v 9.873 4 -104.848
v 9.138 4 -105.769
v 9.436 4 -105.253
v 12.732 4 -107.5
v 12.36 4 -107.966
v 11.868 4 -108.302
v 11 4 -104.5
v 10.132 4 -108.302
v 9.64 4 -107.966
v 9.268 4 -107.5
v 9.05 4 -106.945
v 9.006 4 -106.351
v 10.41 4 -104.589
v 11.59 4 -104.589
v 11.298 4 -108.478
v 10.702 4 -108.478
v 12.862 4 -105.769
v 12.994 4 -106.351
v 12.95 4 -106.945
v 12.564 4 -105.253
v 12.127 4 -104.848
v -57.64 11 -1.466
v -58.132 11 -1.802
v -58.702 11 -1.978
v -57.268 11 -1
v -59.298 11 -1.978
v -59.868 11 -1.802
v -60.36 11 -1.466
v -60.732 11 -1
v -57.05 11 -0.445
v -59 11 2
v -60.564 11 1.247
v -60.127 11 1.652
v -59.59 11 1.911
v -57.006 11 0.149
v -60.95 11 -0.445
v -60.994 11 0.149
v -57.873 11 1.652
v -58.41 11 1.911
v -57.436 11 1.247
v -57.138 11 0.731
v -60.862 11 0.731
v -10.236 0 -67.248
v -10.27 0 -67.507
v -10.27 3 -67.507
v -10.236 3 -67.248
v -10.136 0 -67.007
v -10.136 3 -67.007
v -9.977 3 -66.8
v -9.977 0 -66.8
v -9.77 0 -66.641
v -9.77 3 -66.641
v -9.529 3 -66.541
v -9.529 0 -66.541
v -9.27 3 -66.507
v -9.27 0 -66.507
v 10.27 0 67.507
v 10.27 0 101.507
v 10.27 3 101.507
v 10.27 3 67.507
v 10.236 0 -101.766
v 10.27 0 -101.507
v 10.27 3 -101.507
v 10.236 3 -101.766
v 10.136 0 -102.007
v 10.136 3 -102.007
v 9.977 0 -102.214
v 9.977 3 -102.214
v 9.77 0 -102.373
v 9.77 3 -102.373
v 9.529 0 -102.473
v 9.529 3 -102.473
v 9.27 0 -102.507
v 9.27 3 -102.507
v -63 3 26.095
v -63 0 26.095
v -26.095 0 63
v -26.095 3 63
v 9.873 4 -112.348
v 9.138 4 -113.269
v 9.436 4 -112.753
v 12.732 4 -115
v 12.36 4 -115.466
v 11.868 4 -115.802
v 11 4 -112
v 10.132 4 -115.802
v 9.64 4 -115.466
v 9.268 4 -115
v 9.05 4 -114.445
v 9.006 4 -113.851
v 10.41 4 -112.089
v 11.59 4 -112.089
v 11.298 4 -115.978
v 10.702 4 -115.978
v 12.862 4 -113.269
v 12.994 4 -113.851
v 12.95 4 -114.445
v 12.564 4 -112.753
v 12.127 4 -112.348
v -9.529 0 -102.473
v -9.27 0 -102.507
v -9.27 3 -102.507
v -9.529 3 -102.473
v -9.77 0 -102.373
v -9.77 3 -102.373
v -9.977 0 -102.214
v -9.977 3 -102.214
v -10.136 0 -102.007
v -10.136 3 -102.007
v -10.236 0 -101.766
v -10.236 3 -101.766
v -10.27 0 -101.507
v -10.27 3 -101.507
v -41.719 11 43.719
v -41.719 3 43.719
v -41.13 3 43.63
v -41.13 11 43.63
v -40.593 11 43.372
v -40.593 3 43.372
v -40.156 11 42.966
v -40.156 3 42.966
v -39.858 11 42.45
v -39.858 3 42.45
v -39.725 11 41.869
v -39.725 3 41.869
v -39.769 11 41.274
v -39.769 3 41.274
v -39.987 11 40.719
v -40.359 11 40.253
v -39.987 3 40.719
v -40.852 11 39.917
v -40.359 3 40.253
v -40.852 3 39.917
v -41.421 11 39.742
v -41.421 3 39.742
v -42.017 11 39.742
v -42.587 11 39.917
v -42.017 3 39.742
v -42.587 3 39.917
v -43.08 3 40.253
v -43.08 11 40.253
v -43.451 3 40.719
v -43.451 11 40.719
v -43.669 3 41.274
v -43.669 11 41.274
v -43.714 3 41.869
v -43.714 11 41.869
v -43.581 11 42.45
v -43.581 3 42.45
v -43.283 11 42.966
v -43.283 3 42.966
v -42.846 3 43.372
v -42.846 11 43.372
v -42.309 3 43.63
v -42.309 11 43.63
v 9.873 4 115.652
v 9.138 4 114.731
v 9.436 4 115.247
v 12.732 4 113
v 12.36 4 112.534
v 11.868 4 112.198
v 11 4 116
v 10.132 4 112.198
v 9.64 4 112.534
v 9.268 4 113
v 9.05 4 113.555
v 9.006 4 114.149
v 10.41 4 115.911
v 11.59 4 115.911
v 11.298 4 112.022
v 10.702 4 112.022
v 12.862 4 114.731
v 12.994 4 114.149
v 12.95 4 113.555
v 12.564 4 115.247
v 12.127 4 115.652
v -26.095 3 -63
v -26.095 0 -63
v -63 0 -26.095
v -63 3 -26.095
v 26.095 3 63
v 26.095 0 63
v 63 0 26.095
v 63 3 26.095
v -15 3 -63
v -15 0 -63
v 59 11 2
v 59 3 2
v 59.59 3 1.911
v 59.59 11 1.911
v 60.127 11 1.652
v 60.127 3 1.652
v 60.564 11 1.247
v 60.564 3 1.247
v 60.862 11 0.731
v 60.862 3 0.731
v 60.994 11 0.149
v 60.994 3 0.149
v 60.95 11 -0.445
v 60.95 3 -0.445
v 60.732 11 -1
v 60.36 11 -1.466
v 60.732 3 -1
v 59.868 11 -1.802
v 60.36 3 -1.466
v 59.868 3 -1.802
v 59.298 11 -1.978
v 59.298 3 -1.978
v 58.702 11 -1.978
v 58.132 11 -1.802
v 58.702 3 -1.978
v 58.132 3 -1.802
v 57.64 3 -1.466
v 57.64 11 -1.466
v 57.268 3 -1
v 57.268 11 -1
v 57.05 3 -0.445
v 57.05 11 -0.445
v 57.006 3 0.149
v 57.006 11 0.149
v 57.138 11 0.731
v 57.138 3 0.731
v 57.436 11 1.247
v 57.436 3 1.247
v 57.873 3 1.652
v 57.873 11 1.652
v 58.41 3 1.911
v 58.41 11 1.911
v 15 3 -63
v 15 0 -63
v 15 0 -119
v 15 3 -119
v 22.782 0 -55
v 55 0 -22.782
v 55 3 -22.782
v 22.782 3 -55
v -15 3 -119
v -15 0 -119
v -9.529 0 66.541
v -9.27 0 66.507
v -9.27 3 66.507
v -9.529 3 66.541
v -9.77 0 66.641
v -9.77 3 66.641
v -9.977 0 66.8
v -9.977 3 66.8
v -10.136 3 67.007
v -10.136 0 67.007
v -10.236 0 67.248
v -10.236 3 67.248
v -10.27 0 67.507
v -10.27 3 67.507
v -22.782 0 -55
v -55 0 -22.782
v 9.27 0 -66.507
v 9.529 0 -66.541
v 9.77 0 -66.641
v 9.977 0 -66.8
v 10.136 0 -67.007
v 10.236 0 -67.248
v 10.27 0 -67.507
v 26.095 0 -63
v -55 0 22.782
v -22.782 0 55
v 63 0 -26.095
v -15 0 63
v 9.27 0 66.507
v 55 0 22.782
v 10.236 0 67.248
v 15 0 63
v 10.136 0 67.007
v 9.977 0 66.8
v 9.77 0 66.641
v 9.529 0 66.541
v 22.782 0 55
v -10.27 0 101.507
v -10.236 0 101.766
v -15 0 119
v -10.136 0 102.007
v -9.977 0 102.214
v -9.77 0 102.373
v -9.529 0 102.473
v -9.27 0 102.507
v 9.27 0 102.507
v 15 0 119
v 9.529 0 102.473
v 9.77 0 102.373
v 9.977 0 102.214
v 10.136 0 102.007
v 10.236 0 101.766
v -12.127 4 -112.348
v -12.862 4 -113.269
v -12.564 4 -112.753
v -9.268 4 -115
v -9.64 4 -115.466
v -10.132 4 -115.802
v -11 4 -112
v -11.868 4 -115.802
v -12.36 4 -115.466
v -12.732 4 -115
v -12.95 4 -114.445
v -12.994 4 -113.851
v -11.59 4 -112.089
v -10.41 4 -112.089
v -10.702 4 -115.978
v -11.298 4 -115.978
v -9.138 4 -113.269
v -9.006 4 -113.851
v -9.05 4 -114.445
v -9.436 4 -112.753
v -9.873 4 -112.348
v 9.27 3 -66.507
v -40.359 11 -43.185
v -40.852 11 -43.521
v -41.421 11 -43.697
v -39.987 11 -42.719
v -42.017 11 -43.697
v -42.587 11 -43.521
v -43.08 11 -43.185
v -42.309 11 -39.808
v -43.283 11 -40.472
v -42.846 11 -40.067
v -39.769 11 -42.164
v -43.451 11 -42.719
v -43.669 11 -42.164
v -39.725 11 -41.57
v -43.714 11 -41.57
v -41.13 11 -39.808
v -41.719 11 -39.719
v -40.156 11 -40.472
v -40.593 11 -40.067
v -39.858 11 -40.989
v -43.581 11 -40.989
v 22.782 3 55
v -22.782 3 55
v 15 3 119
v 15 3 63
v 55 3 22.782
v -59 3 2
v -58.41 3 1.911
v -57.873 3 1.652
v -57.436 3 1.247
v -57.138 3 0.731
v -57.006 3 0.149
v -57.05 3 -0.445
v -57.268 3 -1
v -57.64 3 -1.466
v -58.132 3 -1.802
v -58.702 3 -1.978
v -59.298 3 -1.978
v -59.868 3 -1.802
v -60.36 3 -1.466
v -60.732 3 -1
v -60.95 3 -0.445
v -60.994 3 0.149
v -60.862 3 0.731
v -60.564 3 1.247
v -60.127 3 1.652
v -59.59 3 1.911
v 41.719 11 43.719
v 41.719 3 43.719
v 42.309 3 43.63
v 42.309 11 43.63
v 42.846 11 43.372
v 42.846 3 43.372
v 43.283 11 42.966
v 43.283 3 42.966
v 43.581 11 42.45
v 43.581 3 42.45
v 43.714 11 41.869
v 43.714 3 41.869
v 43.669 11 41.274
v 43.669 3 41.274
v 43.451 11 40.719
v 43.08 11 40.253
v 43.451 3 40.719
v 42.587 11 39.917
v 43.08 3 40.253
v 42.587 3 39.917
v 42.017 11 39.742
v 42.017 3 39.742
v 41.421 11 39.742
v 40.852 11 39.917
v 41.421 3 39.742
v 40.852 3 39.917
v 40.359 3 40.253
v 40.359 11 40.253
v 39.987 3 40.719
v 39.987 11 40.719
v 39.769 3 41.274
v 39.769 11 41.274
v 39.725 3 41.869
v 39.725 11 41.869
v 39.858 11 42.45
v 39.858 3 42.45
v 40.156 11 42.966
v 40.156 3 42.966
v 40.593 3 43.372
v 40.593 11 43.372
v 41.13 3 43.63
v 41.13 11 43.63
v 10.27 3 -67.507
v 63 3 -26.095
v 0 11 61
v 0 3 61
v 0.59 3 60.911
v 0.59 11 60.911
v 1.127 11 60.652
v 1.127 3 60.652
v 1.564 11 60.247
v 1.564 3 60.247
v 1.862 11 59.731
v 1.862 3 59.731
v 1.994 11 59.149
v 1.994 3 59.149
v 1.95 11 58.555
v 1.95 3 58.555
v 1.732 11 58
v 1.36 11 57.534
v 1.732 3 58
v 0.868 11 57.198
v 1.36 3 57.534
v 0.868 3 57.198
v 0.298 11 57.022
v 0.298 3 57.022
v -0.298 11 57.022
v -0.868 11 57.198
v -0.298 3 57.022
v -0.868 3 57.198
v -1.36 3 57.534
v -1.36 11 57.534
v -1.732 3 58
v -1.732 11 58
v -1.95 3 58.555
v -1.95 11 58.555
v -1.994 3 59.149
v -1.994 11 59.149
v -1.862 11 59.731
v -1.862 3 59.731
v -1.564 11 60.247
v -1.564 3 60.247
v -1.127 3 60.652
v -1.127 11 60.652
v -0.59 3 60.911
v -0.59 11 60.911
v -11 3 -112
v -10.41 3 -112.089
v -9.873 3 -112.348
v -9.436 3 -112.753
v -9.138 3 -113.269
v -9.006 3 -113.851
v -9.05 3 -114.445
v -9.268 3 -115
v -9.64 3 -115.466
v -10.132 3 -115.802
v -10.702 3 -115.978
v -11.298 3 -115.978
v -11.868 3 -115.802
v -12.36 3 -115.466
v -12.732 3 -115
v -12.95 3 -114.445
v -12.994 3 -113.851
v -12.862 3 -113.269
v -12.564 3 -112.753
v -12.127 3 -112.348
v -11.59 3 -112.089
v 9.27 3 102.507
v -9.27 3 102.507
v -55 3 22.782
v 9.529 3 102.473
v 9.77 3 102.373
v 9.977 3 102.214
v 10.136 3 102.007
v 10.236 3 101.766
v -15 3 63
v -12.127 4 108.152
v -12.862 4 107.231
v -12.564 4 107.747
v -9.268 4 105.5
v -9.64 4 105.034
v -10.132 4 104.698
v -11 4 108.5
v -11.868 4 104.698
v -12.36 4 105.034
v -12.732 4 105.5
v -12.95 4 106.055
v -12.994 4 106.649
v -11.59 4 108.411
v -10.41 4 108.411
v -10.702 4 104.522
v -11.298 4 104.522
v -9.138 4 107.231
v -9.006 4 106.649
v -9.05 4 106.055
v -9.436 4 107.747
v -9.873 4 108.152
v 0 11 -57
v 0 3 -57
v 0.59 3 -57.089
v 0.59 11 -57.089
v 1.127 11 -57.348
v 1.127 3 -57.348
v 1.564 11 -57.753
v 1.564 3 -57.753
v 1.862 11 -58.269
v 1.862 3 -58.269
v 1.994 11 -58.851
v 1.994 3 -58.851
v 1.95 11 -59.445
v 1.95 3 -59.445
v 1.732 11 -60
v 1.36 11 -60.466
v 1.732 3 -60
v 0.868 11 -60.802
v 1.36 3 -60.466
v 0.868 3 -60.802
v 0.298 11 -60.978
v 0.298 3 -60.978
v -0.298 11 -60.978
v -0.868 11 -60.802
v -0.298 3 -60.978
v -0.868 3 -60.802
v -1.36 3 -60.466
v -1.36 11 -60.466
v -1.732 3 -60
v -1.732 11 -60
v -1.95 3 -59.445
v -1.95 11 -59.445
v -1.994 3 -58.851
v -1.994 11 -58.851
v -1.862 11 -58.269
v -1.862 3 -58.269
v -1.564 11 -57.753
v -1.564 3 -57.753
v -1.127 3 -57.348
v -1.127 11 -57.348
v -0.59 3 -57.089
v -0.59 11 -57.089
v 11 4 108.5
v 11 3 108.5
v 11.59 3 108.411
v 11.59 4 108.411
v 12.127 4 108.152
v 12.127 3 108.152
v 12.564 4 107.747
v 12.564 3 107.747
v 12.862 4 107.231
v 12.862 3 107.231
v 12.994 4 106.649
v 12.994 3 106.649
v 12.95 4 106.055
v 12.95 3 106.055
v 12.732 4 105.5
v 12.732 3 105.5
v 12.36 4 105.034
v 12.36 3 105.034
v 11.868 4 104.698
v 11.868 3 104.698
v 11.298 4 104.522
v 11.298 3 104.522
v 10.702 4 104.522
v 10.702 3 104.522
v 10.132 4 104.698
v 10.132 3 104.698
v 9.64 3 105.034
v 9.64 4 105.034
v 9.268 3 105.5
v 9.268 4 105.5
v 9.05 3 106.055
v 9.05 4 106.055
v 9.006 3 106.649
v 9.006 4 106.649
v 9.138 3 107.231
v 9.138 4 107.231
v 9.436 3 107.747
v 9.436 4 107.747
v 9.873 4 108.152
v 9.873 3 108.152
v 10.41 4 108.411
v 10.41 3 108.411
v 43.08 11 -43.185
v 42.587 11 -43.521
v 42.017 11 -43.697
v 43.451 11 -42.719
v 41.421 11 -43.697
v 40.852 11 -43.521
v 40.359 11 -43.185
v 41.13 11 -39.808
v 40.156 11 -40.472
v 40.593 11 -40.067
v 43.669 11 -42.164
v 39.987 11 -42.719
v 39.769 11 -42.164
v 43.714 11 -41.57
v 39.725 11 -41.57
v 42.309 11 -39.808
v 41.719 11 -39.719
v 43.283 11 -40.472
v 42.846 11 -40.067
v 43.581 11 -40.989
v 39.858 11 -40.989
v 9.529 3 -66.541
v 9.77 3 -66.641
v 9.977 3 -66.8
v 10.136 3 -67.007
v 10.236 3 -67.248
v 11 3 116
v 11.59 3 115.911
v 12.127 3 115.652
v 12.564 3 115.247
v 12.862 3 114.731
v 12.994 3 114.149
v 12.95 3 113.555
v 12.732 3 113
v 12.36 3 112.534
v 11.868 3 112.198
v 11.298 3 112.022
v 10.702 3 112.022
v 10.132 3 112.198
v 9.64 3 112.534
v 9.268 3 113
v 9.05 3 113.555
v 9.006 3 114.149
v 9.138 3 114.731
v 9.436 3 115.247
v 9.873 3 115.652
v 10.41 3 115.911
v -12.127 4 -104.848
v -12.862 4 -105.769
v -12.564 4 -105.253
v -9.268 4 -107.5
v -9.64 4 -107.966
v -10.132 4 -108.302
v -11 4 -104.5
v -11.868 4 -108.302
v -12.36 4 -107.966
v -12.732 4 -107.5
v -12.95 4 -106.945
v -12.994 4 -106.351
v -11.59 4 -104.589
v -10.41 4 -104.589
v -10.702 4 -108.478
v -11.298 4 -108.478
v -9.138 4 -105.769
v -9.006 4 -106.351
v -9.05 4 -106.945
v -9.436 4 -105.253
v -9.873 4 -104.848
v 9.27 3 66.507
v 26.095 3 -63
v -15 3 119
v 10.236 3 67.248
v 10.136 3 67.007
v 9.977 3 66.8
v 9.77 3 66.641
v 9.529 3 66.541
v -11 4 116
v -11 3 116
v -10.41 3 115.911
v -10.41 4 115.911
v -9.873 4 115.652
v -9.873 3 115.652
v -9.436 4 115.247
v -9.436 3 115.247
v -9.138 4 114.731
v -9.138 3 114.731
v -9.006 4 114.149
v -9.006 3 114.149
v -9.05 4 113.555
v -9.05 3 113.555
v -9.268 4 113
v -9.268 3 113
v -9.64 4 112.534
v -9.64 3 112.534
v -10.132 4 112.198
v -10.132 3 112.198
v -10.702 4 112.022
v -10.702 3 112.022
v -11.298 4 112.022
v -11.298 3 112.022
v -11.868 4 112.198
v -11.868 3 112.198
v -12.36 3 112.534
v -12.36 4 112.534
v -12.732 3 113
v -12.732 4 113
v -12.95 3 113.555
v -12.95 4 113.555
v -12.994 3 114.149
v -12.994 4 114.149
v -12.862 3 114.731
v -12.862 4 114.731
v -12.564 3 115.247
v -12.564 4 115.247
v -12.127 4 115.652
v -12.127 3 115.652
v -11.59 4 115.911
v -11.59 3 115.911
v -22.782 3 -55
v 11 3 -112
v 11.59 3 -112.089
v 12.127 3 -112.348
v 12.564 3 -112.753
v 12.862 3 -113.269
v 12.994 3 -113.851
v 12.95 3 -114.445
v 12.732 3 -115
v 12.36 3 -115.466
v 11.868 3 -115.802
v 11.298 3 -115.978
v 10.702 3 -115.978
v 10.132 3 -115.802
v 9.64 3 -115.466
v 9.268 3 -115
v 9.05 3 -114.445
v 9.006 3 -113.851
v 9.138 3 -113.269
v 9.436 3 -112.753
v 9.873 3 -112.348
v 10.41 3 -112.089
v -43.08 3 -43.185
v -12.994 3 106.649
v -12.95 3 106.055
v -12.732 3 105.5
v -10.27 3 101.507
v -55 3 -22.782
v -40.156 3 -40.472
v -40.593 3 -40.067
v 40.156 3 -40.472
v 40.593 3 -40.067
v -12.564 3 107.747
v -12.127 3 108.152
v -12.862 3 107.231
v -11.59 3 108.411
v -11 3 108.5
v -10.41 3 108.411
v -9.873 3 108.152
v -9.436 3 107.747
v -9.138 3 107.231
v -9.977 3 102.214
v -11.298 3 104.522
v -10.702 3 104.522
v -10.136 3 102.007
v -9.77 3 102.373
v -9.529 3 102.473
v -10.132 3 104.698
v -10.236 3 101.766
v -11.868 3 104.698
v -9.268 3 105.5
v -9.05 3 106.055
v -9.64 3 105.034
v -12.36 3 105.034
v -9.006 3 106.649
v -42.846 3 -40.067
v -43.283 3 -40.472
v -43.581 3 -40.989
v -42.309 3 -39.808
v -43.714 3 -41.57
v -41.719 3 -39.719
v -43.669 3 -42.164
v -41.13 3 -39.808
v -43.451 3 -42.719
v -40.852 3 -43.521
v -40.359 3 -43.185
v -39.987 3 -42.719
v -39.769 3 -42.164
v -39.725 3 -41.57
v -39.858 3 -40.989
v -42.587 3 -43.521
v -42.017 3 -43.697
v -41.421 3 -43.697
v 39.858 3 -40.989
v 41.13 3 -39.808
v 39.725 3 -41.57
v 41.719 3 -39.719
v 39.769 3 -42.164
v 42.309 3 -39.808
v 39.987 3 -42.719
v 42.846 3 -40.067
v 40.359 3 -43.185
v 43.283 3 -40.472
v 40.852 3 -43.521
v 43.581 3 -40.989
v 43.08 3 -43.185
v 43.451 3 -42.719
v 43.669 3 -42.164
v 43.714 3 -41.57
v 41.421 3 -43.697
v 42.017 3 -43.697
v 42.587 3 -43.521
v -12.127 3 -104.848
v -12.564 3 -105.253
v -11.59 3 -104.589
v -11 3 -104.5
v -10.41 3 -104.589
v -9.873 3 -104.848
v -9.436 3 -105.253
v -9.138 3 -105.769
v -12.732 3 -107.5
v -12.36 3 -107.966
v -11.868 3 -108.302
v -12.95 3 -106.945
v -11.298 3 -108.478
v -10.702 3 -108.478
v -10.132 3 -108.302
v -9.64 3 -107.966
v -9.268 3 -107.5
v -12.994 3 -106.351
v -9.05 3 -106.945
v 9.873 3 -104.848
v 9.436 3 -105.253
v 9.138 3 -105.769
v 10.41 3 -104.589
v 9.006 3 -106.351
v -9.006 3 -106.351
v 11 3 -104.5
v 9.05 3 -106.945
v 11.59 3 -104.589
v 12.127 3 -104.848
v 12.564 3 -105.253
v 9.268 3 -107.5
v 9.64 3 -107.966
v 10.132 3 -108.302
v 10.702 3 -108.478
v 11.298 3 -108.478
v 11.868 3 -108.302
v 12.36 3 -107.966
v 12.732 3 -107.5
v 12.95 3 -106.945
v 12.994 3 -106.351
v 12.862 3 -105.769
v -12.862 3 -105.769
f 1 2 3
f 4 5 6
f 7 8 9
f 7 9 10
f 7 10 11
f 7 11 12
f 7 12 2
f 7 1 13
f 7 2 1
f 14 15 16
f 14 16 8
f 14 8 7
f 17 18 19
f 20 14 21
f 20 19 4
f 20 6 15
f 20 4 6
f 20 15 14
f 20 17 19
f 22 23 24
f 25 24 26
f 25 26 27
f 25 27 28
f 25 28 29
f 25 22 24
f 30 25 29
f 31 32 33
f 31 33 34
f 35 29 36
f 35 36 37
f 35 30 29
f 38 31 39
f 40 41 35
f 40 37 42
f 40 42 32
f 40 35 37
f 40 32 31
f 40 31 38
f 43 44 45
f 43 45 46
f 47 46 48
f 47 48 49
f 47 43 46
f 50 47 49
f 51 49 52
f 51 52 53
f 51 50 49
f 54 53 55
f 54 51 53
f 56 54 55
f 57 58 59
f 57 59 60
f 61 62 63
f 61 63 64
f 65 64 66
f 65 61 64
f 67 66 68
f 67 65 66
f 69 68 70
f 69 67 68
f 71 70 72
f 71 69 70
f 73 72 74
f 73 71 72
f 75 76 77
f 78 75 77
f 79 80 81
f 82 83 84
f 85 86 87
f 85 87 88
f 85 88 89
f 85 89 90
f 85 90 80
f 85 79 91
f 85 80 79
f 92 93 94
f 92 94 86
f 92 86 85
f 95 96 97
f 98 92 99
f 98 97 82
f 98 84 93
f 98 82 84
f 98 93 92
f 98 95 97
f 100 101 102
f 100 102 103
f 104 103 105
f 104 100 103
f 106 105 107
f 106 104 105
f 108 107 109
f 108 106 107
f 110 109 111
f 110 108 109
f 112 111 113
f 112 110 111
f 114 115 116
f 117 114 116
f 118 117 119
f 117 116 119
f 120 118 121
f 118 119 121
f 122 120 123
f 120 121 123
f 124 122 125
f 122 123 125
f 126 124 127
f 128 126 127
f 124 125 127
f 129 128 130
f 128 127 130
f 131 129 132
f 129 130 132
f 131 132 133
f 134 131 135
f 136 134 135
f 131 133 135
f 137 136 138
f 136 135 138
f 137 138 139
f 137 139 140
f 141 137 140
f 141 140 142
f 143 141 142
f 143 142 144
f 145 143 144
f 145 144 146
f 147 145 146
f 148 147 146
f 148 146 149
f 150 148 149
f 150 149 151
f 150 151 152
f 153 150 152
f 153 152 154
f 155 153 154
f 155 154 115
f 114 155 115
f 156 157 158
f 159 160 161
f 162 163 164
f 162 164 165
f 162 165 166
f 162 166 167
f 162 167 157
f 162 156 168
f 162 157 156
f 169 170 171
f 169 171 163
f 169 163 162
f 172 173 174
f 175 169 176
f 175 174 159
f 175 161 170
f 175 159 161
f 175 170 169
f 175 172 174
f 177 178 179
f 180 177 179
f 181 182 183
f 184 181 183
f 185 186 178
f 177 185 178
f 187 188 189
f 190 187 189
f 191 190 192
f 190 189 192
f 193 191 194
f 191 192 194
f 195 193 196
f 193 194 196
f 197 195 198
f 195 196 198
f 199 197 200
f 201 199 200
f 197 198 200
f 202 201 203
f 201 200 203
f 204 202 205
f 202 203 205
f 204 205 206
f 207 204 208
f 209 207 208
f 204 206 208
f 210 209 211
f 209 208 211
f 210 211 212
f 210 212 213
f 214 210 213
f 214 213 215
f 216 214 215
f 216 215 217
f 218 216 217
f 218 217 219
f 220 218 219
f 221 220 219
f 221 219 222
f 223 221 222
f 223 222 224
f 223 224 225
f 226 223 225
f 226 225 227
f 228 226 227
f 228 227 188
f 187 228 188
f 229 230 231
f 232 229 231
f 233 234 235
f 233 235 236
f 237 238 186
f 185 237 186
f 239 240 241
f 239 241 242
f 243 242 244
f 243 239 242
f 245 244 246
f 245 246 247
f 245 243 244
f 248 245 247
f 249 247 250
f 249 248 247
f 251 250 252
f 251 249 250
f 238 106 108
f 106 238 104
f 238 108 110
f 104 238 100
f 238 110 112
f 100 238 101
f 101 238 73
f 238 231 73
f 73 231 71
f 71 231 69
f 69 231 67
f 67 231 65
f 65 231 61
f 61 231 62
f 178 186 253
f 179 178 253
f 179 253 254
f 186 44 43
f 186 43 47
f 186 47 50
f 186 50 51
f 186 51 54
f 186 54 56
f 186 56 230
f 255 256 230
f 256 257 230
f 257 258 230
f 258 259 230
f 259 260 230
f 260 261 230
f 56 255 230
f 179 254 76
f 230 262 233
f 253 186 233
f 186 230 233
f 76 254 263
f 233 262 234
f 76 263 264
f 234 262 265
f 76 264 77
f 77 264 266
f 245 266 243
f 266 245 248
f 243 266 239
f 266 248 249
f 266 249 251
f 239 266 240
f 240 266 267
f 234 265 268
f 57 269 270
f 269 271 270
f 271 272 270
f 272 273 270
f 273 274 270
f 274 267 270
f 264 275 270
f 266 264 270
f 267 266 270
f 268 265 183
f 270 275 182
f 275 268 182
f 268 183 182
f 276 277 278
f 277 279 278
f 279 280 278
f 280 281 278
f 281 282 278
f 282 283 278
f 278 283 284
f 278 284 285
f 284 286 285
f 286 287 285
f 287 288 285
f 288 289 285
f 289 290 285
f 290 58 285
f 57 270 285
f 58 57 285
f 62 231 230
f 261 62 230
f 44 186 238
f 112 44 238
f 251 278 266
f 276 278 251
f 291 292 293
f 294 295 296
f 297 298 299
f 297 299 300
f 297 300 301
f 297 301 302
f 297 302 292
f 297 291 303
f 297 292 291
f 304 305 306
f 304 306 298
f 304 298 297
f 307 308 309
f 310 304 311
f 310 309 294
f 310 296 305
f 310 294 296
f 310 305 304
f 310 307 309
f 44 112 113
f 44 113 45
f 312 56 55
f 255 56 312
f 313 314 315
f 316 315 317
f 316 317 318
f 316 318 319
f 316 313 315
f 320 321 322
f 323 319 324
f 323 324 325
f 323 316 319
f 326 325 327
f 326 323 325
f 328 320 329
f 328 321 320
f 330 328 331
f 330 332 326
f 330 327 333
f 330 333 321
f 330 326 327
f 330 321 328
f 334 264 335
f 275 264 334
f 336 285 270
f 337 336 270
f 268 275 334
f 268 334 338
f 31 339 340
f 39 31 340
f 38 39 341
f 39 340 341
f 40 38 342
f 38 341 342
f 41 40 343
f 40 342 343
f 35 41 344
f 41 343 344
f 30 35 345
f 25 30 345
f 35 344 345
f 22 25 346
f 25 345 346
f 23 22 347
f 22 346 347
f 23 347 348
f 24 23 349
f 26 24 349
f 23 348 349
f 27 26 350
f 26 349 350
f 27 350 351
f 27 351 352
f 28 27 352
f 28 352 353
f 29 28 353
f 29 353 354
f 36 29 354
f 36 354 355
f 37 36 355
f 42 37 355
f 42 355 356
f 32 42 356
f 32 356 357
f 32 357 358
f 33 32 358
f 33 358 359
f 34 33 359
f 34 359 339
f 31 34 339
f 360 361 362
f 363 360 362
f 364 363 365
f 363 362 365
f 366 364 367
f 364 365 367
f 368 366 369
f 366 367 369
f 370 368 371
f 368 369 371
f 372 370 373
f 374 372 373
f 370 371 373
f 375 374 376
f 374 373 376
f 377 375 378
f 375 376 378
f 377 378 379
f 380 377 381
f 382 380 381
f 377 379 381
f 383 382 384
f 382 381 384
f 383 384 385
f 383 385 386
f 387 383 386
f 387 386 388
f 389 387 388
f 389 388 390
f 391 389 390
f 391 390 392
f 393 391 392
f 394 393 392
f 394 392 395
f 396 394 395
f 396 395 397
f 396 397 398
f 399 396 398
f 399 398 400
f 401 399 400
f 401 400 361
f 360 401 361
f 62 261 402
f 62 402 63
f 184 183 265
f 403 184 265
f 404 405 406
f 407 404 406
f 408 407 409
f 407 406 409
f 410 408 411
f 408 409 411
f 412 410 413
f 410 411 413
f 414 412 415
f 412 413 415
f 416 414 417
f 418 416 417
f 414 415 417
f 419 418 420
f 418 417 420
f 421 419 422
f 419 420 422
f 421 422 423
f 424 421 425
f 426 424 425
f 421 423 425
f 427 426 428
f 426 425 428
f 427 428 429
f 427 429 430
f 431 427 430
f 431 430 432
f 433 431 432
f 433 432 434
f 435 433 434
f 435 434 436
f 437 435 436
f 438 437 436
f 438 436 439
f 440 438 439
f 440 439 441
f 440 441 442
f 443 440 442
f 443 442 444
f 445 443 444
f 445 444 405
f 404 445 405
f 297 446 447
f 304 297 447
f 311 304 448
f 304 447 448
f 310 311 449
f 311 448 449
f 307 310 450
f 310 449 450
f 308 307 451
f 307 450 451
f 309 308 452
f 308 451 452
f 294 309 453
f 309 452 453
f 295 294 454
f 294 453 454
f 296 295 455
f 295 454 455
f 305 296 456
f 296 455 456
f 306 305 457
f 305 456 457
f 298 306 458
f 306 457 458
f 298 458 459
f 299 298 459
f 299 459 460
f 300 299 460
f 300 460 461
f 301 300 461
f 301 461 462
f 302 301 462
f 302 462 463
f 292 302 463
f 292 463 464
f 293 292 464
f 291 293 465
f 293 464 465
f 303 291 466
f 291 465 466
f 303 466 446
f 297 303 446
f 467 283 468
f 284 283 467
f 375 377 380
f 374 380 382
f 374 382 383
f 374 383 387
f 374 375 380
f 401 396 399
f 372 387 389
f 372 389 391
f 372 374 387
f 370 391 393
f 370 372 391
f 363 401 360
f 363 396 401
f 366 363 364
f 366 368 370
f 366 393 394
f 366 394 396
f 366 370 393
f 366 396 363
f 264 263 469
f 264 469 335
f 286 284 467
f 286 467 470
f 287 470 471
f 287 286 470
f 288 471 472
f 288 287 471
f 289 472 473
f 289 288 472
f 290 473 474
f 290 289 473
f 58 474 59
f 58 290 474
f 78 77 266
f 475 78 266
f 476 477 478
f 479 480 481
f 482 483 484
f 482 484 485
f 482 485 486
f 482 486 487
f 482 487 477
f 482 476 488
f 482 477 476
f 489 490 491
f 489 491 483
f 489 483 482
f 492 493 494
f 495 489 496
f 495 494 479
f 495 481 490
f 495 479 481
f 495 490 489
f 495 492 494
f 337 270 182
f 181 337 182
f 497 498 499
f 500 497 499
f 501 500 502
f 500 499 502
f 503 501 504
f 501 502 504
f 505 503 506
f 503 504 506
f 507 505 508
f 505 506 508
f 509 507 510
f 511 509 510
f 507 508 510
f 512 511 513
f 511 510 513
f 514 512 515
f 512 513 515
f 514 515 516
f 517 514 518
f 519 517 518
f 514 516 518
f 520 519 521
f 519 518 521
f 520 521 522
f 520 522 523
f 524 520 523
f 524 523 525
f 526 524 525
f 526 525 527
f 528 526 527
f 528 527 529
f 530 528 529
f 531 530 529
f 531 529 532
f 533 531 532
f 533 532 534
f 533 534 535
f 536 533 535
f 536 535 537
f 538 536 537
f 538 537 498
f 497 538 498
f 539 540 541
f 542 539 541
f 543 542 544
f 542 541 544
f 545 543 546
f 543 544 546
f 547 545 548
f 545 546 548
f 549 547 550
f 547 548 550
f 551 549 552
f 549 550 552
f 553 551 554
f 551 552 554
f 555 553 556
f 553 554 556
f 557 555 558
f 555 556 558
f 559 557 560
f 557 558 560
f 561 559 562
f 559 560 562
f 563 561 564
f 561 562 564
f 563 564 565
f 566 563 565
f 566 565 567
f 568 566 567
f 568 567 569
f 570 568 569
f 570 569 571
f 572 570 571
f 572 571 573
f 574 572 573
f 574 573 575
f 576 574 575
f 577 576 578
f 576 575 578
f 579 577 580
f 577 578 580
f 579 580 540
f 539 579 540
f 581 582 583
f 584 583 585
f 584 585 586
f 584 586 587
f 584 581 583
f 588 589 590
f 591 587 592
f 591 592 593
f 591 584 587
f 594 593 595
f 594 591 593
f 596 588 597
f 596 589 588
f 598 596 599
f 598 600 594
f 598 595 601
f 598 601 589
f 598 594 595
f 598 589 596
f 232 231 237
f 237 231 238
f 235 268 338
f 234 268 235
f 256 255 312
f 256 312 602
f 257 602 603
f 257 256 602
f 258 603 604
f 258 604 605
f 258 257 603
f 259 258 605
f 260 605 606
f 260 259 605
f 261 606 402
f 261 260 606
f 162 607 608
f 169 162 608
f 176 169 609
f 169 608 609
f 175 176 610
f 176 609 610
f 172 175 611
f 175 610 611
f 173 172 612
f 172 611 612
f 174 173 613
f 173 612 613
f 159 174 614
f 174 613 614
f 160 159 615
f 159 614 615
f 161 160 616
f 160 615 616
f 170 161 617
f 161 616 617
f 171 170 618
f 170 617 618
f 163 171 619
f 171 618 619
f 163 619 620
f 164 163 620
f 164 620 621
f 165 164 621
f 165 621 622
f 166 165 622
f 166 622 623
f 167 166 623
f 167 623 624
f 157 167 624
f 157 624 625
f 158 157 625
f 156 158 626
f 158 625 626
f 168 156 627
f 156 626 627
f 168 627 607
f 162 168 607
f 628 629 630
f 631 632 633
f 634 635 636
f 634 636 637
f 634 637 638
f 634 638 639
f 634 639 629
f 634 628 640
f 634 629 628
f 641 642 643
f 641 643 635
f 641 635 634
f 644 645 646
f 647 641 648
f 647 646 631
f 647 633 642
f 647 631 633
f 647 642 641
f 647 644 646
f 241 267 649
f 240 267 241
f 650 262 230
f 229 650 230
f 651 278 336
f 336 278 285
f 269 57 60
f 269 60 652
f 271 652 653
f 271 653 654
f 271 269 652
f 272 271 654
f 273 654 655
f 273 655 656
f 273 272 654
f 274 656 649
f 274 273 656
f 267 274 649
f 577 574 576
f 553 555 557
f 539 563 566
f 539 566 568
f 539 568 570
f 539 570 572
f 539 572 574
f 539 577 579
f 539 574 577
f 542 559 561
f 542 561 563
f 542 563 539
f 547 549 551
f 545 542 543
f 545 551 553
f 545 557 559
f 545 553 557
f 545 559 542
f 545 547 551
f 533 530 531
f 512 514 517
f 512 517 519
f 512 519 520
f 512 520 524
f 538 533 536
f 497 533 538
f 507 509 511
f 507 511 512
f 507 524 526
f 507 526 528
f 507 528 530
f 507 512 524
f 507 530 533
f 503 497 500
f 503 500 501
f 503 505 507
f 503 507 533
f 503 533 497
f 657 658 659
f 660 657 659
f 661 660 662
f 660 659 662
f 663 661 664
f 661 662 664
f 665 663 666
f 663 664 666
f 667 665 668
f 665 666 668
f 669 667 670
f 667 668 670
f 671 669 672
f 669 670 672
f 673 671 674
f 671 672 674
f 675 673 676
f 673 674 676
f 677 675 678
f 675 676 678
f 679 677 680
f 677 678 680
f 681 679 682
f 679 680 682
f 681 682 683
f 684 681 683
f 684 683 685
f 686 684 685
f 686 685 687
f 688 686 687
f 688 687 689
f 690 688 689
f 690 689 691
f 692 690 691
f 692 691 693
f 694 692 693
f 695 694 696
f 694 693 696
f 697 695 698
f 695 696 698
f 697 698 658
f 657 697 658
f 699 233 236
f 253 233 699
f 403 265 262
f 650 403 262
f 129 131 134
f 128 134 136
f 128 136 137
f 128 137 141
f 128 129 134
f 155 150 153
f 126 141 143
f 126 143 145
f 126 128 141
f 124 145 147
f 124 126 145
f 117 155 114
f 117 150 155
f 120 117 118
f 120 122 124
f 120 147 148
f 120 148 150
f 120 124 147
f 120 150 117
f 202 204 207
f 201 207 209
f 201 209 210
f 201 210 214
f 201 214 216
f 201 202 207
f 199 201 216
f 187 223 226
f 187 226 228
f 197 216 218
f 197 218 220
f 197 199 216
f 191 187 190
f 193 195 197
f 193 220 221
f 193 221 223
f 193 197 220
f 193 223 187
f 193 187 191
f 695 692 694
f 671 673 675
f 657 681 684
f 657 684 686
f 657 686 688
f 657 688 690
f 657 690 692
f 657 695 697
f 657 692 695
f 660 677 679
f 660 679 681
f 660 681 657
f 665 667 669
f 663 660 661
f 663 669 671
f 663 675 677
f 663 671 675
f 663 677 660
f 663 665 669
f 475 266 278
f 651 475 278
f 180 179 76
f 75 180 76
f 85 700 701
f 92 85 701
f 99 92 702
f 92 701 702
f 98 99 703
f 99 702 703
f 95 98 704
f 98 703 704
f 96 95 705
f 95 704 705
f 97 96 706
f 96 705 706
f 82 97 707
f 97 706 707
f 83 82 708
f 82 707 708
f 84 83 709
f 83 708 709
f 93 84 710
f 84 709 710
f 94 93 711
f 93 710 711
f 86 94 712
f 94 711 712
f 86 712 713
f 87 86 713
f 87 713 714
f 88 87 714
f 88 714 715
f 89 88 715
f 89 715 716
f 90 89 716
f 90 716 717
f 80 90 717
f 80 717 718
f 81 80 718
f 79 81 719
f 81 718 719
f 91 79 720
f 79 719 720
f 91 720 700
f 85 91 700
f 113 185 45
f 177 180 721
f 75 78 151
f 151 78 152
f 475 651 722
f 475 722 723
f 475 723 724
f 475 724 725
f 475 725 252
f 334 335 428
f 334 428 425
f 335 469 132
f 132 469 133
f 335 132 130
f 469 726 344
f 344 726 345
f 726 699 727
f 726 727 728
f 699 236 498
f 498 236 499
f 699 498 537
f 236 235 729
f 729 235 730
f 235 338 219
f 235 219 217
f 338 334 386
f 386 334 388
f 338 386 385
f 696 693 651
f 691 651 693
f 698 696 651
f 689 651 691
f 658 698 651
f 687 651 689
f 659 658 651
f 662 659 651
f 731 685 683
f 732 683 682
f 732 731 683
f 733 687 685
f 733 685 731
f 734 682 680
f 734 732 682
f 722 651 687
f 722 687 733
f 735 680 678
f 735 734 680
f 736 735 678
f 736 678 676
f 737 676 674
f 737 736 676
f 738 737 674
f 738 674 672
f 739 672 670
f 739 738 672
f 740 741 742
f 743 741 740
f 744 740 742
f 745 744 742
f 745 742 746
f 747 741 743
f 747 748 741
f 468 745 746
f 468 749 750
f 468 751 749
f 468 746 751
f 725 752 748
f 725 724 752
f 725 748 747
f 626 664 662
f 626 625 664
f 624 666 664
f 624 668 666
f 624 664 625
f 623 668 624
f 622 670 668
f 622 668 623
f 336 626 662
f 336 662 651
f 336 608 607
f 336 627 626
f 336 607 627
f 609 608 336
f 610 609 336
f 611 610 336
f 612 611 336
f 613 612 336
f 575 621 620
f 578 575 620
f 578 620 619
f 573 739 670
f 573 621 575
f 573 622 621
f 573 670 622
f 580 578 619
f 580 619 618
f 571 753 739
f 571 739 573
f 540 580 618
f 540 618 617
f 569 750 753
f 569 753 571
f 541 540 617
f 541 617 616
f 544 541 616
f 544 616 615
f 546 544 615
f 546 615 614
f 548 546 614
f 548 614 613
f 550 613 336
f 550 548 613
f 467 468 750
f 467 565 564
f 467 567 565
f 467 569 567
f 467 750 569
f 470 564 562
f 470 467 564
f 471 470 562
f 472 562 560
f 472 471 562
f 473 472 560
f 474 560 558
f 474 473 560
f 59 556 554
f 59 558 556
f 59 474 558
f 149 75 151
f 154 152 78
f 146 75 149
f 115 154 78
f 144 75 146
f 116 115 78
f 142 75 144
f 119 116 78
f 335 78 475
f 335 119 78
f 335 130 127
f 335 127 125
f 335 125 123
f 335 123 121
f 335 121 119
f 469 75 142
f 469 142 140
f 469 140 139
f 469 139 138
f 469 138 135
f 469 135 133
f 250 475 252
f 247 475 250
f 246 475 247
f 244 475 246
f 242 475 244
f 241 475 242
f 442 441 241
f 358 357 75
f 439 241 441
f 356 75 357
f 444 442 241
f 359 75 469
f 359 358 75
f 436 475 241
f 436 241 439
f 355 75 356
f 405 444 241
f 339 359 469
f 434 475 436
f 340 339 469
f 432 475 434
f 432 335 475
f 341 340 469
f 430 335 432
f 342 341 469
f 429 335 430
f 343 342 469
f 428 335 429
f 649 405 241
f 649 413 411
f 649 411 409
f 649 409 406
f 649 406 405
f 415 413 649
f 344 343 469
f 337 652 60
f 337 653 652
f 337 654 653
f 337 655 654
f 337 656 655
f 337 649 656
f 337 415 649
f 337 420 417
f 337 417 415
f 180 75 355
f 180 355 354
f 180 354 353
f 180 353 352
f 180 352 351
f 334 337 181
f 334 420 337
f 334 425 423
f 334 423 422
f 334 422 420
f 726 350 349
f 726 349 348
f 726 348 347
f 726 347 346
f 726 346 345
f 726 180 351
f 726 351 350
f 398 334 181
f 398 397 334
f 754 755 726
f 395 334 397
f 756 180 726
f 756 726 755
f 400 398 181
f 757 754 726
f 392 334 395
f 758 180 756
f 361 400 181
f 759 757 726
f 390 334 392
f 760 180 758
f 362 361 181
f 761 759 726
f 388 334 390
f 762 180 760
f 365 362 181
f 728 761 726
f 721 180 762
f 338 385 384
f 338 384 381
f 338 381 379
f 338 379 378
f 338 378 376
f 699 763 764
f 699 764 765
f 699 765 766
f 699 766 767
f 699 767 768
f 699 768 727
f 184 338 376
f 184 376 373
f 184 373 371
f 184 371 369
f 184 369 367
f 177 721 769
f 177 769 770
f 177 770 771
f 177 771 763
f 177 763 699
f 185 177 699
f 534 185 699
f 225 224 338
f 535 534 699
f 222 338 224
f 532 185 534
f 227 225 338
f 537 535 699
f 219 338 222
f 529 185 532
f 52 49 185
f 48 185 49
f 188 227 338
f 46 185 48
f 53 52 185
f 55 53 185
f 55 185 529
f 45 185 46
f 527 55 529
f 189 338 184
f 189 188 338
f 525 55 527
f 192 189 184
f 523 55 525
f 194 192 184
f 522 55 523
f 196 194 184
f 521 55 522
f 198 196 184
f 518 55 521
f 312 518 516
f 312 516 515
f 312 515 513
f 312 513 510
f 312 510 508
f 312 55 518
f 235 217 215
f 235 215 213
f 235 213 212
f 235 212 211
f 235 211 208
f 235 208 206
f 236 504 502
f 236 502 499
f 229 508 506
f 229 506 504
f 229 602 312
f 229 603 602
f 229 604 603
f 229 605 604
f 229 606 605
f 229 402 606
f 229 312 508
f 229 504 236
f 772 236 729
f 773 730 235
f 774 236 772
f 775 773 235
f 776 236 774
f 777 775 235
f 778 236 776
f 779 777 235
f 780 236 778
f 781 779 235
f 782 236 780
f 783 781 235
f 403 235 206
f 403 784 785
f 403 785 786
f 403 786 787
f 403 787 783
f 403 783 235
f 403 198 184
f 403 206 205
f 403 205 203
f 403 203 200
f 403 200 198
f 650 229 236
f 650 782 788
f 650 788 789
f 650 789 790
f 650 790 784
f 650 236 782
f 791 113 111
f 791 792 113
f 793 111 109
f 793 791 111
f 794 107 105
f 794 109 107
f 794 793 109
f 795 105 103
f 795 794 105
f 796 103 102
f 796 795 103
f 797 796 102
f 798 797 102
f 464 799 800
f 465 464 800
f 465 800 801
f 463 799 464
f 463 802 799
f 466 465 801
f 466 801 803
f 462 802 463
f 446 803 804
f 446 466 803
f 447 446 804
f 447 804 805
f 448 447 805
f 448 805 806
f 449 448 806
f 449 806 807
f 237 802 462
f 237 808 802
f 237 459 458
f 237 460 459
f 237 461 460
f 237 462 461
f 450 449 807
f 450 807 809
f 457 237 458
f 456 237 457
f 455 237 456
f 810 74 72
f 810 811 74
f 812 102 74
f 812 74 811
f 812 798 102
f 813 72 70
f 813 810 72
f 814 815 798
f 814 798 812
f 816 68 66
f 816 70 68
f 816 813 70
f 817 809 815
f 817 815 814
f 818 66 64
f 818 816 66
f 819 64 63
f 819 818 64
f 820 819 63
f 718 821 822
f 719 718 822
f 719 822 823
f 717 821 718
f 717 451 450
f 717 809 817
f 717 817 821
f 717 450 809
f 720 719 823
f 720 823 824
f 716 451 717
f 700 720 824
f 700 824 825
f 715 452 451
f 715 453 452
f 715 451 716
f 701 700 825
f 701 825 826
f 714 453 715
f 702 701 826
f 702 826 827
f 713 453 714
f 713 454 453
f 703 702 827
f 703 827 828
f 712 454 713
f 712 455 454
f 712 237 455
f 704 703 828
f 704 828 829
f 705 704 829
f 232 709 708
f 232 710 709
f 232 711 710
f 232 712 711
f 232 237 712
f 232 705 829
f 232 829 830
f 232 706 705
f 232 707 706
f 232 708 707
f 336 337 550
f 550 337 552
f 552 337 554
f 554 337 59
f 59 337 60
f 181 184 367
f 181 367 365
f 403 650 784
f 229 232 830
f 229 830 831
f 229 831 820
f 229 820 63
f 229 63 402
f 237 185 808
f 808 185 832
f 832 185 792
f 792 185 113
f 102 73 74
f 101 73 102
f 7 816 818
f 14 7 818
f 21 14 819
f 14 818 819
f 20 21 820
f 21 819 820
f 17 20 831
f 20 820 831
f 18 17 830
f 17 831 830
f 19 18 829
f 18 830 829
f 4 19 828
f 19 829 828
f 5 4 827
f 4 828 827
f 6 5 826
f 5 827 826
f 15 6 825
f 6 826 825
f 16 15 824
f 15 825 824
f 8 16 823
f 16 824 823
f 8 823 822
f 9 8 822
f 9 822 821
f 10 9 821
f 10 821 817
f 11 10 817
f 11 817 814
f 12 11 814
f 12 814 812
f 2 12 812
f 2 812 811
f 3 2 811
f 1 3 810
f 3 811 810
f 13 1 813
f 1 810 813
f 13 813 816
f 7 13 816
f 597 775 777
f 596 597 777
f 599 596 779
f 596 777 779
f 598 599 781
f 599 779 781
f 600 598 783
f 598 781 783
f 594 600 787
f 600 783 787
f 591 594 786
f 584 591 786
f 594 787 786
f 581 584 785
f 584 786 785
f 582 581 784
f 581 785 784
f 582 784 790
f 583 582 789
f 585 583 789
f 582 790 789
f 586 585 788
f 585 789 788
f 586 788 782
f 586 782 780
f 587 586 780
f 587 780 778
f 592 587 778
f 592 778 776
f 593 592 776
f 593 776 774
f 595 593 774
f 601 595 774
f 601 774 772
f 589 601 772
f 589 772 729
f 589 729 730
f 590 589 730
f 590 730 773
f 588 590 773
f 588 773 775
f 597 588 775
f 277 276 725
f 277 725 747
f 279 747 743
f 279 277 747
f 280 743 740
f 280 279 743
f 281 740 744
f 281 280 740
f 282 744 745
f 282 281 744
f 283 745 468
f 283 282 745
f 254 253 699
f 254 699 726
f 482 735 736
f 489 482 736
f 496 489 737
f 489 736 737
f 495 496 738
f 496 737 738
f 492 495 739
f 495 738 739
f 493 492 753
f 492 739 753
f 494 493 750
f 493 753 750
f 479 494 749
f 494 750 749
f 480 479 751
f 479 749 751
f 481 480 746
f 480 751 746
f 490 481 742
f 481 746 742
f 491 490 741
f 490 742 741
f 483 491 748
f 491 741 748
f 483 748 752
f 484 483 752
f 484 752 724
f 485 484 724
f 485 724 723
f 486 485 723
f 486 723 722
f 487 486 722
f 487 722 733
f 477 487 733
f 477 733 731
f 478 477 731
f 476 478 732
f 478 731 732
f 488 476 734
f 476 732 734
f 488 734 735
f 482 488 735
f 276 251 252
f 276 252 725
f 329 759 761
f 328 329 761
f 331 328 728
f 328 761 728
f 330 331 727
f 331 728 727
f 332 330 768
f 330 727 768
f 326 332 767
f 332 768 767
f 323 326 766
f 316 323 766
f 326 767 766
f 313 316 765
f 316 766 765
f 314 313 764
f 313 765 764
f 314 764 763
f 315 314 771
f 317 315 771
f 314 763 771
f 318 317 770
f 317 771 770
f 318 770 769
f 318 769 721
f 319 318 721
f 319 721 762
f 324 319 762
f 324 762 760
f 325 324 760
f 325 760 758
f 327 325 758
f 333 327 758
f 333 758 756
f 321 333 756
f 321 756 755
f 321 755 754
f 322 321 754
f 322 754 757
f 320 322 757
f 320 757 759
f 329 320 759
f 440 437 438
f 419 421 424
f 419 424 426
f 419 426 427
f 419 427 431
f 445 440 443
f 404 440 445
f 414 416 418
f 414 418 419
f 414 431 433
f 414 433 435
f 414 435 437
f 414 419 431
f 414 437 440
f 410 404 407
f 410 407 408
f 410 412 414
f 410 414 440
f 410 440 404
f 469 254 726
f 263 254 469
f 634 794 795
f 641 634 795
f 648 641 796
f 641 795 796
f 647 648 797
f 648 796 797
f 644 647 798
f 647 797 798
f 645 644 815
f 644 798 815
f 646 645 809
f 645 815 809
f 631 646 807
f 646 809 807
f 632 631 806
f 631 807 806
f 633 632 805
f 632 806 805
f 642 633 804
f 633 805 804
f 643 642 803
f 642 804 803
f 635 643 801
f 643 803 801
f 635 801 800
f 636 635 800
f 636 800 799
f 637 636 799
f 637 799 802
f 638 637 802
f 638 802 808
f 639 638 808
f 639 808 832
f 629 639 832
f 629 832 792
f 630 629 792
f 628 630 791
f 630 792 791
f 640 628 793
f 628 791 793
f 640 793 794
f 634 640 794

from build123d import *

# Parameters (mm, degrees)
BOSS_EXTRUDE1_DEPTH = 3
SKETCH3_R           = 2
BOSS_EXTRUDE4_DEPTH = 1
SKETCH5_R           = 2
BOSS_EXTRUDE8_DEPTH = 11


with BuildPart() as part:
    # Sketch2 → Boss-Extrude1 (new body)
    with BuildSketch(Plane(origin=(0, 0, 0), x_dir=(1, 0, 0), z_dir=(0, 1, 0))):
        Polygon((15, -119), (15, -63), (26.09545443, -63), (63, -26.09545443), (63, 26.09545443), (26.09545443, 63), (15, 63), (15, 119), (-15, 119), (-15, 63), (-26.09545443, 63), (-63, 26.09545443), (-63, -26.09545443), (-26.09545443, -63), (-15, -63), (-15, -119), align=None)
        with BuildLine():
            ThreePointArc((-9.27, 102.507028553), (-9.977106781, 102.214135334), (-10.27, 101.507028553))
            Line((-10.27, 101.507028553), (-10.27, 67.507028553))
            ThreePointArc((-10.27, 67.507028553), (-9.977106781, 66.799921772), (-9.27, 66.507028553))
            Line((-9.27, 66.507028553), (9.27, 66.507028553))
            ThreePointArc((9.27, 66.507028553), (9.977106781, 66.799921772), (10.27, 67.507028553))
            Line((10.27, 67.507028553), (10.27, 101.507028553))
            ThreePointArc((10.27, 101.507028553), (9.977106781, 102.214135334), (9.27, 102.507028553))
            Line((9.27, 102.507028553), (-9.27, 102.507028553))
        make_face(mode=Mode.SUBTRACT)
        with BuildLine():
            ThreePointArc((-10.27, -101.507028553), (-9.977106781, -102.214135334), (-9.27, -102.507028553))
            Line((-9.27, -102.507028553), (9.27, -102.507028553))
            ThreePointArc((9.27, -102.507028553), (9.977106781, -102.214135334), (10.27, -101.507028553))
            Line((10.27, -101.507028553), (10.27, -67.507028553))
            ThreePointArc((10.27, -67.507028553), (9.977106781, -66.799921772), (9.27, -66.507028553))
            Line((9.27, -66.507028553), (-9.27, -66.507028553))
            ThreePointArc((-9.27, -66.507028553), (-9.977106781, -66.799921772), (-10.27, -67.507028553))
            Line((-10.27, -67.507028553), (-10.27, -101.507028553))
        make_face(mode=Mode.SUBTRACT)
        Polygon((-22.781745931, -55), (22.781745931, -55), (55, -22.781745931), (55, 22.781745931), (22.781745931, 55), (-22.781745931, 55), (-55, 22.781745931), (-55, -22.781745931), align=None, mode=Mode.SUBTRACT)
    extrude(amount=BOSS_EXTRUDE1_DEPTH)

    # Sketch3 → Boss-Extrude4 (add)
    with BuildSketch(Plane(origin=(0, 3, 0), x_dir=(1, 0, 0), z_dir=(0, 1, 0))):
        with Locations(Location((-11, 114, 0), (0, 0, 270))):
            Circle(SKETCH3_R)
        with Locations(Location((-11, 106.5, 0), (0, 0, 270))):
            Circle(SKETCH3_R)
        with Locations(Location((11, 114, 0), (0, 0, 270))):
            Circle(SKETCH3_R)
        with Locations(Location((11, 106.5, 0), (0, 0, 270))):
            Circle(SKETCH3_R)
        with Locations(Location((11, -114, 0), (0, 0, 270))):
            Circle(SKETCH3_R)
        with Locations(Location((-11, -114, 0), (0, 0, 270))):
            Circle(SKETCH3_R)
        with Locations(Location((-11, -106.5, 0), (0, 0, 270))):
            Circle(SKETCH3_R)
        with Locations(Location((11, -106.5, 0), (0, 0, 270))):
            Circle(SKETCH3_R)
    extrude(amount=BOSS_EXTRUDE4_DEPTH)

    # Sketch5 → Boss-Extrude8 (add)
    with BuildSketch(Plane(origin=(0, 0, 0), x_dir=(1, 0, 0), z_dir=(0, 1, 0))):
        with Locations(Location((0, 59, 0), (0, 0, 270))):
            Circle(SKETCH5_R)
        with Locations(Location((41.71930009, 41.71930009, 0), (0, 0, 270))):
            Circle(SKETCH5_R)
        with Locations(Location((59, 0, 0), (0, 0, 270))):
            Circle(SKETCH5_R)
        with Locations(Location((41.71930009, -41.71930009, 0), (0, 0, 270))):
            Circle(SKETCH5_R)
        with Locations(Location((0, -59, 0), (0, 0, 270))):
            Circle(SKETCH5_R)
        with Locations(Location((-41.71930009, -41.71930009, 0), (0, 0, 270))):
            Circle(SKETCH5_R)
        with Locations(Location((-59, 0, 0), (0, 0, 270))):
            Circle(SKETCH5_R)
        with Locations(Location((-41.71930009, 41.71930009, 0), (0, 0, 270))):
            Circle(SKETCH5_R)
    extrude(amount=BOSS_EXTRUDE8_DEPTH)


solid = part.part
